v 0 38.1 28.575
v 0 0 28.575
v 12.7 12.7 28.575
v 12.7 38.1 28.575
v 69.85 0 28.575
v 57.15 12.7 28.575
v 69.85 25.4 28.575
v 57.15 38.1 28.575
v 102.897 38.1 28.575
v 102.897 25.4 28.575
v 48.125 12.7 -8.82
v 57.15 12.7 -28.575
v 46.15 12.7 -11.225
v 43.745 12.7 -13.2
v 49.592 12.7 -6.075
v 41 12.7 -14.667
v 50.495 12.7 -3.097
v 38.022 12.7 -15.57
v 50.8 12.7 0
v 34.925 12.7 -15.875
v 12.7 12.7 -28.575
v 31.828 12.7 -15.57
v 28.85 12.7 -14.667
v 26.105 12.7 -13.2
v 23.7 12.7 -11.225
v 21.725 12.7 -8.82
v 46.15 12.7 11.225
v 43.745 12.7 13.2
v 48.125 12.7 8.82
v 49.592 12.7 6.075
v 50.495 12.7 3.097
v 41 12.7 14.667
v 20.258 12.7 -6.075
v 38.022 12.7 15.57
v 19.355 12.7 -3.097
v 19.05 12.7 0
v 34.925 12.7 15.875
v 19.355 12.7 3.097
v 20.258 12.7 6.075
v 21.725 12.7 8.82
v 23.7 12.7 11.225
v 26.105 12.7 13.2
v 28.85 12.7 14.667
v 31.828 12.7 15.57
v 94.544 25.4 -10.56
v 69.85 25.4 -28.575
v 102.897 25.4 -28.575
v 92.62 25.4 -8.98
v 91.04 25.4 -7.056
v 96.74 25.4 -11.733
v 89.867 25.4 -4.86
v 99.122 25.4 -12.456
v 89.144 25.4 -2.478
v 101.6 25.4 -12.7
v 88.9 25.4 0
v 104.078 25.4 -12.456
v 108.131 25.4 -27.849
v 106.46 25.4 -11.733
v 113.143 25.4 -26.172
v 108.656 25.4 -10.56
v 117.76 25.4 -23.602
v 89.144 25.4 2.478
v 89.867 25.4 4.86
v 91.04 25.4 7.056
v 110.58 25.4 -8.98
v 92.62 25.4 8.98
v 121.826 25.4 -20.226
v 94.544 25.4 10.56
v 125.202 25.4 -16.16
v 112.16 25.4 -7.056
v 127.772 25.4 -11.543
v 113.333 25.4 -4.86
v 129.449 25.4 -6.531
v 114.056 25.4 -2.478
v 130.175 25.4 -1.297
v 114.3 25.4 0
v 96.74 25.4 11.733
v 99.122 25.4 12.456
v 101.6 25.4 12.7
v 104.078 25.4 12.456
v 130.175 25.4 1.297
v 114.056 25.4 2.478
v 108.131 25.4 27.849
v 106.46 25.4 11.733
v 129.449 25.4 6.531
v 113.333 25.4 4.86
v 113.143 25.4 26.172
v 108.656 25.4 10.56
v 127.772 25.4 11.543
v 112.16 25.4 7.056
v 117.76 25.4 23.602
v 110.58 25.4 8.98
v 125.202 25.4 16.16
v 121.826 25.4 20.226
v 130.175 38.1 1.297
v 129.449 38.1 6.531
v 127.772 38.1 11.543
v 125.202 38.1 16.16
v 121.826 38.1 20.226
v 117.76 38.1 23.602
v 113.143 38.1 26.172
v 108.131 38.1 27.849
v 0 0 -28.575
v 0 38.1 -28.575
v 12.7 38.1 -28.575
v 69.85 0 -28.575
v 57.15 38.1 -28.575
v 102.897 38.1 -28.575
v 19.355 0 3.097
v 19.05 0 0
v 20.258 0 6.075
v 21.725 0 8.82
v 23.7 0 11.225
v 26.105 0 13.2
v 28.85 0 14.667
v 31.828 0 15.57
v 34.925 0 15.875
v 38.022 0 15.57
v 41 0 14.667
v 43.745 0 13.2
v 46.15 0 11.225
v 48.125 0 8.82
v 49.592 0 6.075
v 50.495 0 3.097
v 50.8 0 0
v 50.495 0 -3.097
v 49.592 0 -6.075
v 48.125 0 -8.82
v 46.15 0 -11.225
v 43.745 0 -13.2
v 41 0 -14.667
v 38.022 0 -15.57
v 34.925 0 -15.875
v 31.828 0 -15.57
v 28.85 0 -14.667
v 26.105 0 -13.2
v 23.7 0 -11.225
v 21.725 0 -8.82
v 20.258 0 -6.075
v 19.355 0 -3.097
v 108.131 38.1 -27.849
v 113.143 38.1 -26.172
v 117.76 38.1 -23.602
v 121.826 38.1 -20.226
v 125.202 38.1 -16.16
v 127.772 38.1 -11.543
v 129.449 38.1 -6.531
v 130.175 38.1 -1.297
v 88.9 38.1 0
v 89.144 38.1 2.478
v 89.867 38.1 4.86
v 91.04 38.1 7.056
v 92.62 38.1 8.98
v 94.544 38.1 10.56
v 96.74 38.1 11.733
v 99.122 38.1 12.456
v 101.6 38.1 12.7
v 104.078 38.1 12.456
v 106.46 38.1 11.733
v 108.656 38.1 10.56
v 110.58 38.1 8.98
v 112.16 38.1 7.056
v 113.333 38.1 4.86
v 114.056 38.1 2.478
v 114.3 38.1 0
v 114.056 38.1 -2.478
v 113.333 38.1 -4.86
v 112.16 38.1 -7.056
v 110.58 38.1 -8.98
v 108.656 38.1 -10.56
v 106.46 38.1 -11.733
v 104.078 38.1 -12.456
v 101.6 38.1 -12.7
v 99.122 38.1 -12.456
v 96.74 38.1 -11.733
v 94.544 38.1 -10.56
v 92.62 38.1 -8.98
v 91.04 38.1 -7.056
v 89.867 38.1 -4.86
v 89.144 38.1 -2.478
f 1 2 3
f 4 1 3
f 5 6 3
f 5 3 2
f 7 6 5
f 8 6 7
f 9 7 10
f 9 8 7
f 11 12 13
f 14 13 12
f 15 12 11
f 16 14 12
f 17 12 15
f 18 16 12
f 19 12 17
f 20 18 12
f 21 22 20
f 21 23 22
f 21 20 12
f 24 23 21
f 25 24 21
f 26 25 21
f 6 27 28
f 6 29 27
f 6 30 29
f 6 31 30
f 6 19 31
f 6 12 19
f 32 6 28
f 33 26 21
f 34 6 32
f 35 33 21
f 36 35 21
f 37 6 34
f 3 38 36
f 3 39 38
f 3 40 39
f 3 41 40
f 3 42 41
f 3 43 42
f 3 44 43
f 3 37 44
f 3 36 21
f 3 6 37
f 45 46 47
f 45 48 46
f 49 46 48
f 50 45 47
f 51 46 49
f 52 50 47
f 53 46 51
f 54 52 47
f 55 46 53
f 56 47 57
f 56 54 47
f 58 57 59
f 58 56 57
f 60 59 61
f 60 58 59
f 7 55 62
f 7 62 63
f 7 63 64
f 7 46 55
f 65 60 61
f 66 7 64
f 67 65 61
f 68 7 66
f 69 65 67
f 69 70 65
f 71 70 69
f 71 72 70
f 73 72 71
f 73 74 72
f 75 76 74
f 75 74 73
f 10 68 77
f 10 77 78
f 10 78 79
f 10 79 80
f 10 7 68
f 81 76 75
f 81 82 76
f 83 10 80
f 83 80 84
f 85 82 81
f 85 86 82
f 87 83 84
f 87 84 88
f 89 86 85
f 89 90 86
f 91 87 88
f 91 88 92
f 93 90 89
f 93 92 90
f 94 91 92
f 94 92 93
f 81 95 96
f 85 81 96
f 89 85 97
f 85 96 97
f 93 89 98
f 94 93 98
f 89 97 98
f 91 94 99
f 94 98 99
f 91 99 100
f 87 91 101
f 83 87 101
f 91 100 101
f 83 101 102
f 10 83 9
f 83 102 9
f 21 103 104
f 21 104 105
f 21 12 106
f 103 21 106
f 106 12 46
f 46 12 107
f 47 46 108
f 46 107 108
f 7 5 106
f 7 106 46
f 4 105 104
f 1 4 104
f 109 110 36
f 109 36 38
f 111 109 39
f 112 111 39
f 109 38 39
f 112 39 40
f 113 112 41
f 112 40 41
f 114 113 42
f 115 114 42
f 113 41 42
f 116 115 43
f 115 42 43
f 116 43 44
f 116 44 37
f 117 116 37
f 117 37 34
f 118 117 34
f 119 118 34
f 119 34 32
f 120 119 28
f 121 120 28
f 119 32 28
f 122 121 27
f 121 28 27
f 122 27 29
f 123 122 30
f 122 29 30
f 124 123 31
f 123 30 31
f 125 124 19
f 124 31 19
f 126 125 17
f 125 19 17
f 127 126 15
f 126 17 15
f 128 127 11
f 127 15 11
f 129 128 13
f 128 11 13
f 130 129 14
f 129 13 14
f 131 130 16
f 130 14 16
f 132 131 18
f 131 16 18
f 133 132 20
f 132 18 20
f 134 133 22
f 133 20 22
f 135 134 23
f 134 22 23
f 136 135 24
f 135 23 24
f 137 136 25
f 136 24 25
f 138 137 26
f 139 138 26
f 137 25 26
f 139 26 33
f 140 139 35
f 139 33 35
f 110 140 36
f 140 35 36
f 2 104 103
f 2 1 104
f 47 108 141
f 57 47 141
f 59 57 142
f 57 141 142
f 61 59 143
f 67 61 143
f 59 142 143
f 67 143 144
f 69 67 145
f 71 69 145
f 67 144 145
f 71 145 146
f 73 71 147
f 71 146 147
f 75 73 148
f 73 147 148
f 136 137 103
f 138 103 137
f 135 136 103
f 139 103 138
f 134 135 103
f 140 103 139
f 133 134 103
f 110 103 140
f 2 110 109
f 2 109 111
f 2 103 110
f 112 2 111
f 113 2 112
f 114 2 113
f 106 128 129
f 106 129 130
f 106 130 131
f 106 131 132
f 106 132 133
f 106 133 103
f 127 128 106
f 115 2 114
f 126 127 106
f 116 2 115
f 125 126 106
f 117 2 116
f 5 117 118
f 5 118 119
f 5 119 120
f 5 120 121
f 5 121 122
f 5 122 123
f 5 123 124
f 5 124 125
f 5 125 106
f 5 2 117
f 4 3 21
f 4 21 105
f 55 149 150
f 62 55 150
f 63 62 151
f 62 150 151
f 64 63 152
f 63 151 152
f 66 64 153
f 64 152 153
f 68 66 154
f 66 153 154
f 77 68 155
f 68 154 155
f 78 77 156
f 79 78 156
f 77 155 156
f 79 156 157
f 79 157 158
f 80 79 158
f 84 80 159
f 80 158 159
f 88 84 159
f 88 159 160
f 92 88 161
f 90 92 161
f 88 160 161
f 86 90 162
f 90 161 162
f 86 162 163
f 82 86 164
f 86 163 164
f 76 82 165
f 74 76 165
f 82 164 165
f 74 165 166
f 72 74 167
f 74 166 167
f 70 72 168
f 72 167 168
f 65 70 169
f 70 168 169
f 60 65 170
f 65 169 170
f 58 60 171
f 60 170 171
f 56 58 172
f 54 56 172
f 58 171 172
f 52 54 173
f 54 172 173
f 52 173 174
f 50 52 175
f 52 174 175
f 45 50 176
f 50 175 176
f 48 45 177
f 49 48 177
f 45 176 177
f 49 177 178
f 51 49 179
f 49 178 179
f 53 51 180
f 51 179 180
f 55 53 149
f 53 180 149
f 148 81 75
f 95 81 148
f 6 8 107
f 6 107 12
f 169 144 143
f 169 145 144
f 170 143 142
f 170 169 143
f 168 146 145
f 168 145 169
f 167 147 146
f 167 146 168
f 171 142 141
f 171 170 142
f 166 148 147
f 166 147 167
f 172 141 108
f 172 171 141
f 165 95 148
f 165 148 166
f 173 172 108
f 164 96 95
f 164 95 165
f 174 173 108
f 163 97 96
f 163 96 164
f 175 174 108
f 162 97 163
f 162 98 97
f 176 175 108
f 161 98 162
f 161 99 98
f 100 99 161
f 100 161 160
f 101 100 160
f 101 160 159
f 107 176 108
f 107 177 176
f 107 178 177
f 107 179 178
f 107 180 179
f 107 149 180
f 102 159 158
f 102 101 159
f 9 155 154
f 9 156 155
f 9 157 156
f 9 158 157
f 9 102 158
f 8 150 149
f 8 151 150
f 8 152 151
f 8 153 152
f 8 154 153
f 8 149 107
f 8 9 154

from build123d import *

# Parameters (mm, degrees)
BOSS_EXTRUDE1_DEPTH = 28.575
SKETCH3_R           = 15.875
CUT_EXTRUDE1_DEPTH  = 12.7
SKETCH4_R           = 12.7
CUT_EXTRUDE2_DEPTH  = 12.7


with BuildPart() as part:
    # Sketch2 → Boss-Extrude1 (new, symmetric)
    with BuildSketch(Plane.XY):
        Polygon((0, 0), (69.85, 0), (69.85, 25.4), (130.175, 25.4), (130.175, 38.1), (57.15, 38.1), (57.15, 12.7), (12.7, 12.7), (12.7, 38.1), (0, 38.1), align=None)
    extrude(amount=BOSS_EXTRUDE1_DEPTH, both=True)

    # Sketch3 → Cut-Extrude1 (cut)
    with BuildSketch(Plane(origin=(0, 12.7, 0), x_dir=(1, 0, 0), z_dir=(0, 1, 0))):
        with Locations(Location((34.925, 0, 0), (0, 0, 180))):
            Circle(SKETCH3_R)
    extrude(amount=-CUT_EXTRUDE1_DEPTH, mode=Mode.SUBTRACT)

    # Sketch4 → Cut-Extrude2 (cut)
    with BuildSketch(Plane(origin=(0, 38.1, 0), x_dir=(1, 0, 0), z_dir=(0, 1, 0))):
        with Locations(Location((101.6, 0, 0), (0, 0, 180))):
            Circle(SKETCH4_R)
        with BuildLine():
            Line((130.175, 28.575), (102.896747677, 28.575))
            ThreePointArc((102.896747677, 28.575), (121.826371147, 20.226371147), (130.175, 1.296747677))
            Line((130.175, 1.296747677), (130.175, 28.575))
        make_face()
        with BuildLine():
            Line((130.175, -28.575), (130.175, -1.296747677))
            ThreePointArc((130.175, -1.296747677), (121.826371147, -20.226371147), (102.896747677, -28.575))
            Line((102.896747677, -28.575), (130.175, -28.575))
        make_face()
    extrude(amount=-CUT_EXTRUDE2_DEPTH, mode=Mode.SUBTRACT)


solid = part.part
